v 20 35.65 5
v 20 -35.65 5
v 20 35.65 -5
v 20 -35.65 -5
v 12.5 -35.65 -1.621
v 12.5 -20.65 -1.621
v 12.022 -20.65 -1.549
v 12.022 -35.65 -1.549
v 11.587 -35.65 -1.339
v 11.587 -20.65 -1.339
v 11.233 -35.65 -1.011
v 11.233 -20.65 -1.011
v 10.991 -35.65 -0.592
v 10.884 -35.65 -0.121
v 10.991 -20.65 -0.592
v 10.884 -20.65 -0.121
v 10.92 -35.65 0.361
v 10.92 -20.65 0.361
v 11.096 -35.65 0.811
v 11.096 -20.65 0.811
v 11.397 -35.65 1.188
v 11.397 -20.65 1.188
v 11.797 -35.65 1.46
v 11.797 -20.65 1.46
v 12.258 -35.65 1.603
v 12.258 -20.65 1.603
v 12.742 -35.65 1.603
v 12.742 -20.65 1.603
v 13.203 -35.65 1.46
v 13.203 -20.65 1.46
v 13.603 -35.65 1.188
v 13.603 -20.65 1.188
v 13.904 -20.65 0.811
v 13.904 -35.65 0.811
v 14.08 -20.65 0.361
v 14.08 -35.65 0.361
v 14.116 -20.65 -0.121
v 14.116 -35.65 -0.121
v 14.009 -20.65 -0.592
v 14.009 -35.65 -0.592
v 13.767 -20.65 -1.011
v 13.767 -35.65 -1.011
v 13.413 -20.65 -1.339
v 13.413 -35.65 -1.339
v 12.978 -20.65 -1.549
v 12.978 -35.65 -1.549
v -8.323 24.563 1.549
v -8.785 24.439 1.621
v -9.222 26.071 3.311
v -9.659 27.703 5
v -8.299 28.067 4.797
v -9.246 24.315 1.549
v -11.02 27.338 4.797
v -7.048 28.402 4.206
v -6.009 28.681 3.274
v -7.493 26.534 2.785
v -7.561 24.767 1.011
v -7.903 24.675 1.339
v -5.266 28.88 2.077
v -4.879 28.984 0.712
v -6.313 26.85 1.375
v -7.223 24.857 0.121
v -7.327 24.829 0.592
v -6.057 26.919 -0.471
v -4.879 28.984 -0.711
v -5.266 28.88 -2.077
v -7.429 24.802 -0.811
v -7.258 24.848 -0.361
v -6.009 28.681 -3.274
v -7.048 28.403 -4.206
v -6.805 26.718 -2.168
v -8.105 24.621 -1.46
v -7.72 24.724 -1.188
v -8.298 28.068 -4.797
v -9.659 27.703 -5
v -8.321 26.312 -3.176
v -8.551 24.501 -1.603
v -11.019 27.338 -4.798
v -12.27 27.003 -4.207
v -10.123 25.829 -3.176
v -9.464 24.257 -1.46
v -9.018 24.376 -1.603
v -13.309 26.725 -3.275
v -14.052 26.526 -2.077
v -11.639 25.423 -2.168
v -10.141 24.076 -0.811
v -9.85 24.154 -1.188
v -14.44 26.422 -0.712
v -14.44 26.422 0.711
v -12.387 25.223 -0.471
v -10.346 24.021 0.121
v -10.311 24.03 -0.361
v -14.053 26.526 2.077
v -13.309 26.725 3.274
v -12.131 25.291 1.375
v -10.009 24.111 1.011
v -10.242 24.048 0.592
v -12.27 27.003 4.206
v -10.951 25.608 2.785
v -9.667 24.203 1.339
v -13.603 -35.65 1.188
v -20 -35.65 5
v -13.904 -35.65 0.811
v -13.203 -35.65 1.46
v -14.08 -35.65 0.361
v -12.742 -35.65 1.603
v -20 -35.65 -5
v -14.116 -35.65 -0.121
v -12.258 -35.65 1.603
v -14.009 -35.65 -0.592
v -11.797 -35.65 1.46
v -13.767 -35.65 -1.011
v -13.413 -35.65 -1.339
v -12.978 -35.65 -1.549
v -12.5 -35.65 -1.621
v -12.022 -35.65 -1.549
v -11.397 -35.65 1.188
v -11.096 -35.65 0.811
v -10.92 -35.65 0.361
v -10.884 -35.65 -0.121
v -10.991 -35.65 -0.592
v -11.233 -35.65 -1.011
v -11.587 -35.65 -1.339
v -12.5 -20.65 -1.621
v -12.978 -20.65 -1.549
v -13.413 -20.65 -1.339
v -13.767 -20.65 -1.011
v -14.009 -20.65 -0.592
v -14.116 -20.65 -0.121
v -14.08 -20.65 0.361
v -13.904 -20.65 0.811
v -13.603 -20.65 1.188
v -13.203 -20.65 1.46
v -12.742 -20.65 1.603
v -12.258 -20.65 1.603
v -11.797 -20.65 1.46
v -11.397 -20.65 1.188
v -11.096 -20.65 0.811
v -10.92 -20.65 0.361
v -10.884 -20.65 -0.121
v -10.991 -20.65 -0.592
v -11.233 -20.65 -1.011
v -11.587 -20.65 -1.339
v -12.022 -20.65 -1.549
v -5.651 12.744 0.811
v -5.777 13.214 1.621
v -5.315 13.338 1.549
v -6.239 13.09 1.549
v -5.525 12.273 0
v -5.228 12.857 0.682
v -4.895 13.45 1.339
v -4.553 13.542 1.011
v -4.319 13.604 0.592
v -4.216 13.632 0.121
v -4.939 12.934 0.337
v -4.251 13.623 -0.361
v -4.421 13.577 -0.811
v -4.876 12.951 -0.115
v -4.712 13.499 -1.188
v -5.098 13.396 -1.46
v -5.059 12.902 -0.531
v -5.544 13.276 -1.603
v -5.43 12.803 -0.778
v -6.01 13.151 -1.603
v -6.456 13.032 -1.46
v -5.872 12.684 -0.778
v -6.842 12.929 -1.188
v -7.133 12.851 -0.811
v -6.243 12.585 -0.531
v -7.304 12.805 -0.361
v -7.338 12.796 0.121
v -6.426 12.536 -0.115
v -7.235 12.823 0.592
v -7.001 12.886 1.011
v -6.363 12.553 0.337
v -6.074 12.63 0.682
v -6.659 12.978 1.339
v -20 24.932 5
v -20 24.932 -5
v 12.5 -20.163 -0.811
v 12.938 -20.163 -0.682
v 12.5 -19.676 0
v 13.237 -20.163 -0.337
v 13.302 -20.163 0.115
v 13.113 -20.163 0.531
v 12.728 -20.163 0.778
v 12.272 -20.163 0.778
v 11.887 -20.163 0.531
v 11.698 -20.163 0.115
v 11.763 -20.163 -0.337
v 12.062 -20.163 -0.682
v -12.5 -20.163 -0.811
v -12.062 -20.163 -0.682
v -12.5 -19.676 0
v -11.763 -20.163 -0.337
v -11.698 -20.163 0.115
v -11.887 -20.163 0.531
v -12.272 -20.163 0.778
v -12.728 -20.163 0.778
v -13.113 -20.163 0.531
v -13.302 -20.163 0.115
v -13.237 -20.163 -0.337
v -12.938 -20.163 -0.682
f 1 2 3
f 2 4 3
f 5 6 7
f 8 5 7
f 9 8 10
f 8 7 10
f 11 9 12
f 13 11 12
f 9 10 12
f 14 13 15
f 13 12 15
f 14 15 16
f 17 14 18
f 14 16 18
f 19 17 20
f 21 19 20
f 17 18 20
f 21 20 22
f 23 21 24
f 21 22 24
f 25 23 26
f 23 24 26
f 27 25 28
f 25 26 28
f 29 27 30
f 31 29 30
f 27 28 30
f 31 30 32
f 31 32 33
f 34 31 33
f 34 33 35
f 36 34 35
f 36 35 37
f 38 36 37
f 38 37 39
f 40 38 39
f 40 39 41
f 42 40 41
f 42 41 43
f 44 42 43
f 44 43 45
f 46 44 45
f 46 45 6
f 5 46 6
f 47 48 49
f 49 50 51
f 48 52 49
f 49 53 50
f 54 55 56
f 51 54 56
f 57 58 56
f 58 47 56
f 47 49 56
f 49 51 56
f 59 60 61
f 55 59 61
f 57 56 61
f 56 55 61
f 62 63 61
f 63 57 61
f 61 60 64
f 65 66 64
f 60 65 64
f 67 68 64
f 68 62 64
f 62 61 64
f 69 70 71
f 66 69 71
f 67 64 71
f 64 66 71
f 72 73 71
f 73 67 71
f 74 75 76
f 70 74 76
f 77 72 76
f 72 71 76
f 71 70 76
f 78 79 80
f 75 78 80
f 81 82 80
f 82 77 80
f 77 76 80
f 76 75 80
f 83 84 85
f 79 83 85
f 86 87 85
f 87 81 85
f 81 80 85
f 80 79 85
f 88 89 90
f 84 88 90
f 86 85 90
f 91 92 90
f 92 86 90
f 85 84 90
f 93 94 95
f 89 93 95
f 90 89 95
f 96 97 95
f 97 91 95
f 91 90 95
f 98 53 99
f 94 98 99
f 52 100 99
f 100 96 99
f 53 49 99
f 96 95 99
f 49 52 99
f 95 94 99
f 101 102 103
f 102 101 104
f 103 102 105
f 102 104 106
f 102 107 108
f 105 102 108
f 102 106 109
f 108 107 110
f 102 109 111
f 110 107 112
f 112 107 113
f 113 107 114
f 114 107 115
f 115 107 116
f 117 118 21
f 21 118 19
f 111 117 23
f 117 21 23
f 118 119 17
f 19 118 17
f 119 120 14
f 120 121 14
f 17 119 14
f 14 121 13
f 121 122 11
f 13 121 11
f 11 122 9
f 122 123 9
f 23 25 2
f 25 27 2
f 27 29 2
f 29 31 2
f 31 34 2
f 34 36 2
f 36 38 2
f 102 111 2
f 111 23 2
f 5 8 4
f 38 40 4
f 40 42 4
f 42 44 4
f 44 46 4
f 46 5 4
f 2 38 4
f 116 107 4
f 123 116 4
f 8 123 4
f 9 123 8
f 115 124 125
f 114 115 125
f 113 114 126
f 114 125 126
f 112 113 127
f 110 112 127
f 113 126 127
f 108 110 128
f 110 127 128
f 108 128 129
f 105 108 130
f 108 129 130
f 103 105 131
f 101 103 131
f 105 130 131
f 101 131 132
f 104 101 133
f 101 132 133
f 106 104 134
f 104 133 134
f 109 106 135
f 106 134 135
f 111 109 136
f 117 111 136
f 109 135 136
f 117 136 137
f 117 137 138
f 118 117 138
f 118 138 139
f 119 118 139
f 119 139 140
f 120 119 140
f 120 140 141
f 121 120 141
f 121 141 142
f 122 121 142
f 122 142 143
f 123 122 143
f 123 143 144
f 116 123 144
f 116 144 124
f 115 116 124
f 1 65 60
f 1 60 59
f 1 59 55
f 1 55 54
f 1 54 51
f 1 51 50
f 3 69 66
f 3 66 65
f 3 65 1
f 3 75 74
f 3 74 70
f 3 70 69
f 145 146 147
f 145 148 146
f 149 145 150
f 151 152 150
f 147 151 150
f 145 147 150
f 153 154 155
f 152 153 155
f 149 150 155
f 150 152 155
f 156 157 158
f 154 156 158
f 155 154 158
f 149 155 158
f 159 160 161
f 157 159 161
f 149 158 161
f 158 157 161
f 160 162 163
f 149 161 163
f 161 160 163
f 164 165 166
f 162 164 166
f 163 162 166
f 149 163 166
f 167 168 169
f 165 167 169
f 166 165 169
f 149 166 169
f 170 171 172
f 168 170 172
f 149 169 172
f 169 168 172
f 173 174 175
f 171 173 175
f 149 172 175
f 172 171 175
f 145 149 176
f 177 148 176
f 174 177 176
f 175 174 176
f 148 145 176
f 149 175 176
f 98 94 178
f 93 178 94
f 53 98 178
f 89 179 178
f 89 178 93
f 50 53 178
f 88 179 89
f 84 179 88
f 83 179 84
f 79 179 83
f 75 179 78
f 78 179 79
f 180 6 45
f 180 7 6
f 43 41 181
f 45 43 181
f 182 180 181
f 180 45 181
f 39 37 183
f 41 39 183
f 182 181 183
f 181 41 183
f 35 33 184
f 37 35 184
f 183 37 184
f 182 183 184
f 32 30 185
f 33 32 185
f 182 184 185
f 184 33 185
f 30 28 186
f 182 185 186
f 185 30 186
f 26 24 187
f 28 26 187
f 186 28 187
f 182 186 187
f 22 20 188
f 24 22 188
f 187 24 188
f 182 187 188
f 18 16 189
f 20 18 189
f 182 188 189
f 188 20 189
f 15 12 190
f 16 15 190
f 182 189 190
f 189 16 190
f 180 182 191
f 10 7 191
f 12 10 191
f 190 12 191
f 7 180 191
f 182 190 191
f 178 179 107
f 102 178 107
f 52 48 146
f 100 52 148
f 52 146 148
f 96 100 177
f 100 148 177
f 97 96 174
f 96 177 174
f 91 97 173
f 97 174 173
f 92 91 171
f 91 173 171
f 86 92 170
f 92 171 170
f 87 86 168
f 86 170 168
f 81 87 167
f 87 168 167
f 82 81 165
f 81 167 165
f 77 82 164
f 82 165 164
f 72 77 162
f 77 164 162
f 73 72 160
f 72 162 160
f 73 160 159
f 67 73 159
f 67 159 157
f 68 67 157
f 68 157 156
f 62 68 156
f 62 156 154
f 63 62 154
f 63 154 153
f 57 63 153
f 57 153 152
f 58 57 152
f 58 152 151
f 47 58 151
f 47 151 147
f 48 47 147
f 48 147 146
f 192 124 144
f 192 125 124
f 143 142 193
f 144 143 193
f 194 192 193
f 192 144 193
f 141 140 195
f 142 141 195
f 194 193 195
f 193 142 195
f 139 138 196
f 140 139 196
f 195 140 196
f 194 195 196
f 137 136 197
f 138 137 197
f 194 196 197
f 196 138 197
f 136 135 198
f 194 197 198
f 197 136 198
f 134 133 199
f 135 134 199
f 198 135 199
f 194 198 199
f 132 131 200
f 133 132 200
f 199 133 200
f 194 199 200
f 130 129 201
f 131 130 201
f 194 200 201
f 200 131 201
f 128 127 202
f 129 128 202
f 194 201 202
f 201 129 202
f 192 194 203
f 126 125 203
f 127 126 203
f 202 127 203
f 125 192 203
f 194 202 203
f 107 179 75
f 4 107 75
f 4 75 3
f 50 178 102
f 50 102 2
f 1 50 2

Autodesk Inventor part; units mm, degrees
ref_plane "YZ Plane" through (0, 0, 0) normal (1, 0, 0) x (0, 1, 0)
ref_plane "XZ Plane" through (0, 0, 0) normal (0, 1, 0) x (-1, 0, 0)
ref_plane "XY Plane" through (0, 0, 0) normal (0, 0, 1) x (1, 0, 0)
sketch "Esboço1" plane through (0, 0, 0) normal (0, 0, 1) x (1, 0, 0)
  line L0 (-20, -35.65) -> (20, -35.65)
  line L1 (20, -35.65) -> (20, 35.65)
  line L2 (20, 35.65) -> (-20, 35.65)
  line L3 (-20, 35.65) -> (-20, -35.65)
  line L4 (-20, 35.65) -> (20, 35.65)
  circle A0 centre (0, 25.65) radius 5 construction
  circle A1 centre (0, 25.65) radius 28 construction
  circle A2 centre (0, 25.65) radius 74 construction
  line L5 (-20, 6.0541) -> (20, 6.0541) construction
  line L6 (-20, -48.35) -> (20, -48.35) construction
  line L7 (-103.6, 0) -> (103.6, 0) construction
  line L8 (0, -77.95) -> (0, 129.25) construction
  line L9 (-20, 24.932) -> (20, 35.65)
  point P0 (0, 0)
  dimension "d0" = 71.3
  dimension "d1" = 40
  dimension "d41" = 10
  dimension "d42" = 61.3
  dimension "d43" = 56
  dimension "d45" = 84
  dimension "d49" = 15
  dimension "d58" = 10
extrude "Extrusão1" add sketch "Esboço1" along normal mid plane 10
extrude "Extrusão4" cut sketch "Esboço1" along normal through all both and the other way through all contours L3 L2 L9
sketch "Esboço2" plane through (-20, -35.65, -5) normal (0, -1, 0) x (1, 0, 0)
  line L0 (40, 10) -> (40, 0)
  line L1 (40, 5) -> (0, 5) construction
  line L2 (0, 0) -> (0, 10)
  line L3 (0, 0) -> (0, 10) projected
  line L4 (40, 0) -> (40, 10) projected
  line L5 (0, 10) -> (40, 10) construction
  line L6 (20, 10) -> (20, 0) construction
  line L7 (40, 0) -> (0, 0) construction
  point P0 (20, 5)
  point P1 (7.5, 5)
  point P2 (32.5, 5)
  dimension "d9" = 7.5
  dimension "d10" = 7.5
  dimension "d37" = 25
hole "Furo1" at (-12.5, -35.65, 0) at (12.5, -35.65, 0) direction (0, 1, 0) diameter 3.242 depth 15 tip angle 118 thread size "M4x0.7" class "6H" standard "ISO Metric profile"
sketch "Esboço3" plane through (0, 0, 5) normal (0, 0, 1) x (1, 0, 0)
  point P0 (0, 0)
  point P1 (0, 37.5)
  point P2 (0, 25.65)
hole "Furo2" [suppressed]
sketch "Esboço6" plane through (20, 35.65, 5) normal (-0.258819, 0.9659258, 0) x (0.9659258, 0.258819, 0)
  line L0 (0, 0) -> (0, 10) construction
  line L1 (0, 5) -> (-41.411, 5) construction
  line L2 (-41.411, 0) -> (-41.411, 10) construction
  line L3 (-20.7055, 5) -> (-20.7055, 0) construction
  point P0 (-28.5454, 5)
  point P1 (-30.7055, 5)
  point P2 (-10.7055, 5)
  dimension "d50" = 20
hole "Furo3" at (-9.6593, 27.7028, 0) direction (0.258819, -0.9659258, 0) diameter 3.242 depth 15 tip angle 118 countersink diameter 10 countersink angle 90 thread size "M4x0.7" class "6H" standard "ISO Metric profile"
properties part number "GRJ-03-115" material "Fenolite OR"
